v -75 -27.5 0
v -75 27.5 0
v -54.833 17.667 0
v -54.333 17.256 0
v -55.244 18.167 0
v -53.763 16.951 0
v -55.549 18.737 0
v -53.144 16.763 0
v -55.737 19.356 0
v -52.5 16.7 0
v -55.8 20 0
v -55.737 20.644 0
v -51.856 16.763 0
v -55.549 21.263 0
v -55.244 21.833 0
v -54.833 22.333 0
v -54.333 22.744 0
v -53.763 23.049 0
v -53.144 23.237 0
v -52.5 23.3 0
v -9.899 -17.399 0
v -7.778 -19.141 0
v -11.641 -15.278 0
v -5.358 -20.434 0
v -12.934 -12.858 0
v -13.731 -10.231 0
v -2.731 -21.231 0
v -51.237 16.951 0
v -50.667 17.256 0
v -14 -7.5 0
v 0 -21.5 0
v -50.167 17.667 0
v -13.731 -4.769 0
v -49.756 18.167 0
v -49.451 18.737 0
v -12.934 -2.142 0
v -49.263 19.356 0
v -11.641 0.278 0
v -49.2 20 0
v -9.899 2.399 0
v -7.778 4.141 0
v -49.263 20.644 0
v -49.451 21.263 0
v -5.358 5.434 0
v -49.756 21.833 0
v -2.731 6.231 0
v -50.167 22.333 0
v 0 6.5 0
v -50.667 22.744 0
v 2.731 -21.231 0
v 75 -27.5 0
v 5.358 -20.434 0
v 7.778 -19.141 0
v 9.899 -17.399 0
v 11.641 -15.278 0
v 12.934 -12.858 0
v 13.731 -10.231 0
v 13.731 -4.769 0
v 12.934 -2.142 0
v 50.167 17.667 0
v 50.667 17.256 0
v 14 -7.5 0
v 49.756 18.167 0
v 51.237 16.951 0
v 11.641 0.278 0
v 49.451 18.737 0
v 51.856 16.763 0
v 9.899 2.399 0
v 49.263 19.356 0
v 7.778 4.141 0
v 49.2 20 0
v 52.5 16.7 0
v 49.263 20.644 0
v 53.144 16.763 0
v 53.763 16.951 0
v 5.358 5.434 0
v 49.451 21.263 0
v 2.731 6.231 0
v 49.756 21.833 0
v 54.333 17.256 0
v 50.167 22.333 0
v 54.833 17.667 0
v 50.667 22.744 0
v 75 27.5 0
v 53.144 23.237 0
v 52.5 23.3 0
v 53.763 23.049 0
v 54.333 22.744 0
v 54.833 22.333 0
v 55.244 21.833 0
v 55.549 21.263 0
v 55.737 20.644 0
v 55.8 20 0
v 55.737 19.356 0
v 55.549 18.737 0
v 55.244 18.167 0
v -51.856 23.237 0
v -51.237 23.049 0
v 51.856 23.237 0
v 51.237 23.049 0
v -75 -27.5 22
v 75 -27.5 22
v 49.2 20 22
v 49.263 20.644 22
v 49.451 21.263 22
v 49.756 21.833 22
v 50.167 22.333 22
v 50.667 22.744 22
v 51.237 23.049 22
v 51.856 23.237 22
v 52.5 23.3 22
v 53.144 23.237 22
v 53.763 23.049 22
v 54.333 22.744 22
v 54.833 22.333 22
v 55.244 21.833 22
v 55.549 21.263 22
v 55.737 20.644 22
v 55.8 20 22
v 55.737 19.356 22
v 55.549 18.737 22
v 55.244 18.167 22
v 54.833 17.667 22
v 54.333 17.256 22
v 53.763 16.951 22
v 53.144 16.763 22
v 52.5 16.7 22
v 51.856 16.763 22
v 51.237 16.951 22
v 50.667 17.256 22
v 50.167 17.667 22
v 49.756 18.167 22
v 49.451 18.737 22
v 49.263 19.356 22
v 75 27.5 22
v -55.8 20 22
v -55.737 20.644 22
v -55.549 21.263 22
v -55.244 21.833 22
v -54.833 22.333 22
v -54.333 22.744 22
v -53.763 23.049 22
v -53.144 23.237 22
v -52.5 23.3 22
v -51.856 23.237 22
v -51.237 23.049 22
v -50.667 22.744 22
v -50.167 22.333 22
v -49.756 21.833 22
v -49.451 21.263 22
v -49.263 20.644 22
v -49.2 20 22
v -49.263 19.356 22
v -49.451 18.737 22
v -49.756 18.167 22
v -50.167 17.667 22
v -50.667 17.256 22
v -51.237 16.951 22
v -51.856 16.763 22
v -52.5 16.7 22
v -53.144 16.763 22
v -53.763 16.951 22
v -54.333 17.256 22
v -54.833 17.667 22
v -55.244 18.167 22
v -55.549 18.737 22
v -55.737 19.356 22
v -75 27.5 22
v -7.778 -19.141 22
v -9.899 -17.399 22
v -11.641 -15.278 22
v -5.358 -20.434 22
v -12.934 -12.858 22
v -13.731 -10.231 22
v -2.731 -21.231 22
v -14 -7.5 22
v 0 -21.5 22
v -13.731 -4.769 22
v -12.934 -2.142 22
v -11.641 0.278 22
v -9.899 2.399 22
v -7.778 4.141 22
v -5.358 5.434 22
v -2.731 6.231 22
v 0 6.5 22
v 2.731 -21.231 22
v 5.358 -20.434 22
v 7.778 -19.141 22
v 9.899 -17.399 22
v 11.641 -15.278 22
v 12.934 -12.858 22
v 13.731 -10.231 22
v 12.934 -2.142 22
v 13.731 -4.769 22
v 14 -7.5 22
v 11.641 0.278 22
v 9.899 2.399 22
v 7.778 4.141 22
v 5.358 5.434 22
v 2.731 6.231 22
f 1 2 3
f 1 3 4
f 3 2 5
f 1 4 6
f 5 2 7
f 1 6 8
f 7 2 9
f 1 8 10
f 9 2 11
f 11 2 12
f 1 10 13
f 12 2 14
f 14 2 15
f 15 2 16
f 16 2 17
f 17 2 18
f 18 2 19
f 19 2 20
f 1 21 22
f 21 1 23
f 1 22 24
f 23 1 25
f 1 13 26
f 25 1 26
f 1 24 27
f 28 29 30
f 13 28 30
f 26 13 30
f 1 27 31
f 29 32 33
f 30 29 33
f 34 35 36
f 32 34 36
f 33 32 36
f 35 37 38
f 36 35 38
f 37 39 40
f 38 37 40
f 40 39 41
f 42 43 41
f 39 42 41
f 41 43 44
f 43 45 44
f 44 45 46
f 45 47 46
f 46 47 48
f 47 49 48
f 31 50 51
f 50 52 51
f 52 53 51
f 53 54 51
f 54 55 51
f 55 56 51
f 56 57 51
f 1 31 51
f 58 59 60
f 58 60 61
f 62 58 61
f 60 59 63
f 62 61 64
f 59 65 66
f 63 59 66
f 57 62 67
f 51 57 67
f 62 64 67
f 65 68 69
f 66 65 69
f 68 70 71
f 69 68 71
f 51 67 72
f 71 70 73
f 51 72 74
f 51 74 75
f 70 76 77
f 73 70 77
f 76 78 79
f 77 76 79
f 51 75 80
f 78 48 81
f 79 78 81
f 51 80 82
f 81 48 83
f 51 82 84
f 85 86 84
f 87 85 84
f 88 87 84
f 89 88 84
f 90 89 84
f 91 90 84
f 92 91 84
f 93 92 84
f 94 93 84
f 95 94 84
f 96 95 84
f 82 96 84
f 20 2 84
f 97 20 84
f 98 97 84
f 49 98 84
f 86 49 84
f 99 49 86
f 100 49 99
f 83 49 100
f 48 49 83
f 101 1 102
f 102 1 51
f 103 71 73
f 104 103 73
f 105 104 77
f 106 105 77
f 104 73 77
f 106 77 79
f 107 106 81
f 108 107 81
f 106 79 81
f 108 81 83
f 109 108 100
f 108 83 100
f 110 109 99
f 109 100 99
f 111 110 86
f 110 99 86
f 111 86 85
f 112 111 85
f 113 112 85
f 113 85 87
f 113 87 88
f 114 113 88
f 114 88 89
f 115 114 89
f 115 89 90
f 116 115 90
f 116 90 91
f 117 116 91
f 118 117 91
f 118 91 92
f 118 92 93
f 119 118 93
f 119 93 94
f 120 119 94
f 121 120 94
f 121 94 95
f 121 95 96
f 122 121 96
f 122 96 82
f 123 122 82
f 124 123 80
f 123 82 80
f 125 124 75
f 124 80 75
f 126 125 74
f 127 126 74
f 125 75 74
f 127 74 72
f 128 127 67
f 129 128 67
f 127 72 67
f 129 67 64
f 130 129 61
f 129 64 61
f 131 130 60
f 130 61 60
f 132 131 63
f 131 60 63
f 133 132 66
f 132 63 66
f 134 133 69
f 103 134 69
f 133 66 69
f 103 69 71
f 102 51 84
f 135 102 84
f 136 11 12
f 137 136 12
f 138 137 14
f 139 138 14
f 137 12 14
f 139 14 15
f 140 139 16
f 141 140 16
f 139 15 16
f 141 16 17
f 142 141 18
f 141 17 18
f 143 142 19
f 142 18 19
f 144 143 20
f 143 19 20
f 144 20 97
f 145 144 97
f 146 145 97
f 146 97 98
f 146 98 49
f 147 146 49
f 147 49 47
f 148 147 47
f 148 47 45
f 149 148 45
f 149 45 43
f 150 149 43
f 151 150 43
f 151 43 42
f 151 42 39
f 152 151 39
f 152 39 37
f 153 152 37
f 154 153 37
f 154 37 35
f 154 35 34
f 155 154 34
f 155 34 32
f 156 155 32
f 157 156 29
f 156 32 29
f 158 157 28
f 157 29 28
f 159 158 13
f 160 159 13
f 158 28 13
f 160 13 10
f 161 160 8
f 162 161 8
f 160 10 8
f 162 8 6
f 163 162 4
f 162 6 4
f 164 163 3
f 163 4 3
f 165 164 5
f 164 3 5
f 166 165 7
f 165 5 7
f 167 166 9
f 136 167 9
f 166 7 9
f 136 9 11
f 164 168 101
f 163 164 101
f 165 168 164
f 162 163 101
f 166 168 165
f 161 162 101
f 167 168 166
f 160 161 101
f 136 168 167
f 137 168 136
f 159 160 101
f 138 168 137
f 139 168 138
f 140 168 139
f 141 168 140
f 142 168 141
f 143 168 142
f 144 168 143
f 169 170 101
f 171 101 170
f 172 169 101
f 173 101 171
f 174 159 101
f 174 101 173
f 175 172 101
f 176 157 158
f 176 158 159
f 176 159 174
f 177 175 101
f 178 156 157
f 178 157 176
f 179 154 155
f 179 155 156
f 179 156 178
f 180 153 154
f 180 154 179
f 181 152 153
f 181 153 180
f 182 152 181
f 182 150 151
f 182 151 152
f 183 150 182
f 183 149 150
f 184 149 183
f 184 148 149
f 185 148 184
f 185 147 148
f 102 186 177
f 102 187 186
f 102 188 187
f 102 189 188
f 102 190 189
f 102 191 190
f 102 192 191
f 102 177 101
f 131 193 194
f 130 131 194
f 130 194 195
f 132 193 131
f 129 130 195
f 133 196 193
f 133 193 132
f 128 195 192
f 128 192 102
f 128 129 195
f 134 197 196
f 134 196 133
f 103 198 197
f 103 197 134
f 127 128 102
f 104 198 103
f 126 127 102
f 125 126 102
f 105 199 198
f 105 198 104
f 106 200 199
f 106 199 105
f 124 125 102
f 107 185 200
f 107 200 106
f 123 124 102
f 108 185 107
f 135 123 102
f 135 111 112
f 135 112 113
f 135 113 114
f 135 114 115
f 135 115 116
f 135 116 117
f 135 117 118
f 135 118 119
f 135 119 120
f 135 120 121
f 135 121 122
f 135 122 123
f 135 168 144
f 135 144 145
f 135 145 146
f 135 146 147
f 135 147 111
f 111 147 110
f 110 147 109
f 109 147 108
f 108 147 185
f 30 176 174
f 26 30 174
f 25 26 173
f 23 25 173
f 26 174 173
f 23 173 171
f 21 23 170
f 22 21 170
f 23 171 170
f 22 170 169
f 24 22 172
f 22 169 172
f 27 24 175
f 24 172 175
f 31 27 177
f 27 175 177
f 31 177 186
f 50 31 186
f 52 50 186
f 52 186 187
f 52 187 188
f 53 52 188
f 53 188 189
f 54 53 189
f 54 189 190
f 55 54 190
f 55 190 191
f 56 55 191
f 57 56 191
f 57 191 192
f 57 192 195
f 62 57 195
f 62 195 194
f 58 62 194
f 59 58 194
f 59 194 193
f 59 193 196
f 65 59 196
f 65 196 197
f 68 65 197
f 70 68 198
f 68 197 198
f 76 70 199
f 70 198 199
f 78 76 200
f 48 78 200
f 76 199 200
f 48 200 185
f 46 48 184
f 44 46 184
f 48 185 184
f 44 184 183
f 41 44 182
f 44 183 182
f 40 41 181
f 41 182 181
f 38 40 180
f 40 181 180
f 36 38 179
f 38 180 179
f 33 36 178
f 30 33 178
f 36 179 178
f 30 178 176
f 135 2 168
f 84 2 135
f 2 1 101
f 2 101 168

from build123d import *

# Parameters (mm, degrees)
F0_W     = 150
F0_H     = 55
F1_DEPTH = 22
F3_D     = 6.6
F4_D     = 28


with BuildPart() as f1:
    # F0 (on Top) → F1 (new body)
    with BuildSketch(Plane.XY):
        Rectangle(F0_W, F0_H)
    extrude(amount=F1_DEPTH)

    # F3 (through all)
    with Locations(Plane.XY.offset(22)):
        with Locations((-52.5, 20), (52.5, 20)):
            Hole(F3_D / 2)

    # F4 (through all)
    with Locations(Plane(origin=(0, 0, 0), x_dir=(1, 0, 0), z_dir=(0, 0, -1))):
        with Locations((0, 7.5)):
            Hole(F4_D / 2)


solid = f1.part
